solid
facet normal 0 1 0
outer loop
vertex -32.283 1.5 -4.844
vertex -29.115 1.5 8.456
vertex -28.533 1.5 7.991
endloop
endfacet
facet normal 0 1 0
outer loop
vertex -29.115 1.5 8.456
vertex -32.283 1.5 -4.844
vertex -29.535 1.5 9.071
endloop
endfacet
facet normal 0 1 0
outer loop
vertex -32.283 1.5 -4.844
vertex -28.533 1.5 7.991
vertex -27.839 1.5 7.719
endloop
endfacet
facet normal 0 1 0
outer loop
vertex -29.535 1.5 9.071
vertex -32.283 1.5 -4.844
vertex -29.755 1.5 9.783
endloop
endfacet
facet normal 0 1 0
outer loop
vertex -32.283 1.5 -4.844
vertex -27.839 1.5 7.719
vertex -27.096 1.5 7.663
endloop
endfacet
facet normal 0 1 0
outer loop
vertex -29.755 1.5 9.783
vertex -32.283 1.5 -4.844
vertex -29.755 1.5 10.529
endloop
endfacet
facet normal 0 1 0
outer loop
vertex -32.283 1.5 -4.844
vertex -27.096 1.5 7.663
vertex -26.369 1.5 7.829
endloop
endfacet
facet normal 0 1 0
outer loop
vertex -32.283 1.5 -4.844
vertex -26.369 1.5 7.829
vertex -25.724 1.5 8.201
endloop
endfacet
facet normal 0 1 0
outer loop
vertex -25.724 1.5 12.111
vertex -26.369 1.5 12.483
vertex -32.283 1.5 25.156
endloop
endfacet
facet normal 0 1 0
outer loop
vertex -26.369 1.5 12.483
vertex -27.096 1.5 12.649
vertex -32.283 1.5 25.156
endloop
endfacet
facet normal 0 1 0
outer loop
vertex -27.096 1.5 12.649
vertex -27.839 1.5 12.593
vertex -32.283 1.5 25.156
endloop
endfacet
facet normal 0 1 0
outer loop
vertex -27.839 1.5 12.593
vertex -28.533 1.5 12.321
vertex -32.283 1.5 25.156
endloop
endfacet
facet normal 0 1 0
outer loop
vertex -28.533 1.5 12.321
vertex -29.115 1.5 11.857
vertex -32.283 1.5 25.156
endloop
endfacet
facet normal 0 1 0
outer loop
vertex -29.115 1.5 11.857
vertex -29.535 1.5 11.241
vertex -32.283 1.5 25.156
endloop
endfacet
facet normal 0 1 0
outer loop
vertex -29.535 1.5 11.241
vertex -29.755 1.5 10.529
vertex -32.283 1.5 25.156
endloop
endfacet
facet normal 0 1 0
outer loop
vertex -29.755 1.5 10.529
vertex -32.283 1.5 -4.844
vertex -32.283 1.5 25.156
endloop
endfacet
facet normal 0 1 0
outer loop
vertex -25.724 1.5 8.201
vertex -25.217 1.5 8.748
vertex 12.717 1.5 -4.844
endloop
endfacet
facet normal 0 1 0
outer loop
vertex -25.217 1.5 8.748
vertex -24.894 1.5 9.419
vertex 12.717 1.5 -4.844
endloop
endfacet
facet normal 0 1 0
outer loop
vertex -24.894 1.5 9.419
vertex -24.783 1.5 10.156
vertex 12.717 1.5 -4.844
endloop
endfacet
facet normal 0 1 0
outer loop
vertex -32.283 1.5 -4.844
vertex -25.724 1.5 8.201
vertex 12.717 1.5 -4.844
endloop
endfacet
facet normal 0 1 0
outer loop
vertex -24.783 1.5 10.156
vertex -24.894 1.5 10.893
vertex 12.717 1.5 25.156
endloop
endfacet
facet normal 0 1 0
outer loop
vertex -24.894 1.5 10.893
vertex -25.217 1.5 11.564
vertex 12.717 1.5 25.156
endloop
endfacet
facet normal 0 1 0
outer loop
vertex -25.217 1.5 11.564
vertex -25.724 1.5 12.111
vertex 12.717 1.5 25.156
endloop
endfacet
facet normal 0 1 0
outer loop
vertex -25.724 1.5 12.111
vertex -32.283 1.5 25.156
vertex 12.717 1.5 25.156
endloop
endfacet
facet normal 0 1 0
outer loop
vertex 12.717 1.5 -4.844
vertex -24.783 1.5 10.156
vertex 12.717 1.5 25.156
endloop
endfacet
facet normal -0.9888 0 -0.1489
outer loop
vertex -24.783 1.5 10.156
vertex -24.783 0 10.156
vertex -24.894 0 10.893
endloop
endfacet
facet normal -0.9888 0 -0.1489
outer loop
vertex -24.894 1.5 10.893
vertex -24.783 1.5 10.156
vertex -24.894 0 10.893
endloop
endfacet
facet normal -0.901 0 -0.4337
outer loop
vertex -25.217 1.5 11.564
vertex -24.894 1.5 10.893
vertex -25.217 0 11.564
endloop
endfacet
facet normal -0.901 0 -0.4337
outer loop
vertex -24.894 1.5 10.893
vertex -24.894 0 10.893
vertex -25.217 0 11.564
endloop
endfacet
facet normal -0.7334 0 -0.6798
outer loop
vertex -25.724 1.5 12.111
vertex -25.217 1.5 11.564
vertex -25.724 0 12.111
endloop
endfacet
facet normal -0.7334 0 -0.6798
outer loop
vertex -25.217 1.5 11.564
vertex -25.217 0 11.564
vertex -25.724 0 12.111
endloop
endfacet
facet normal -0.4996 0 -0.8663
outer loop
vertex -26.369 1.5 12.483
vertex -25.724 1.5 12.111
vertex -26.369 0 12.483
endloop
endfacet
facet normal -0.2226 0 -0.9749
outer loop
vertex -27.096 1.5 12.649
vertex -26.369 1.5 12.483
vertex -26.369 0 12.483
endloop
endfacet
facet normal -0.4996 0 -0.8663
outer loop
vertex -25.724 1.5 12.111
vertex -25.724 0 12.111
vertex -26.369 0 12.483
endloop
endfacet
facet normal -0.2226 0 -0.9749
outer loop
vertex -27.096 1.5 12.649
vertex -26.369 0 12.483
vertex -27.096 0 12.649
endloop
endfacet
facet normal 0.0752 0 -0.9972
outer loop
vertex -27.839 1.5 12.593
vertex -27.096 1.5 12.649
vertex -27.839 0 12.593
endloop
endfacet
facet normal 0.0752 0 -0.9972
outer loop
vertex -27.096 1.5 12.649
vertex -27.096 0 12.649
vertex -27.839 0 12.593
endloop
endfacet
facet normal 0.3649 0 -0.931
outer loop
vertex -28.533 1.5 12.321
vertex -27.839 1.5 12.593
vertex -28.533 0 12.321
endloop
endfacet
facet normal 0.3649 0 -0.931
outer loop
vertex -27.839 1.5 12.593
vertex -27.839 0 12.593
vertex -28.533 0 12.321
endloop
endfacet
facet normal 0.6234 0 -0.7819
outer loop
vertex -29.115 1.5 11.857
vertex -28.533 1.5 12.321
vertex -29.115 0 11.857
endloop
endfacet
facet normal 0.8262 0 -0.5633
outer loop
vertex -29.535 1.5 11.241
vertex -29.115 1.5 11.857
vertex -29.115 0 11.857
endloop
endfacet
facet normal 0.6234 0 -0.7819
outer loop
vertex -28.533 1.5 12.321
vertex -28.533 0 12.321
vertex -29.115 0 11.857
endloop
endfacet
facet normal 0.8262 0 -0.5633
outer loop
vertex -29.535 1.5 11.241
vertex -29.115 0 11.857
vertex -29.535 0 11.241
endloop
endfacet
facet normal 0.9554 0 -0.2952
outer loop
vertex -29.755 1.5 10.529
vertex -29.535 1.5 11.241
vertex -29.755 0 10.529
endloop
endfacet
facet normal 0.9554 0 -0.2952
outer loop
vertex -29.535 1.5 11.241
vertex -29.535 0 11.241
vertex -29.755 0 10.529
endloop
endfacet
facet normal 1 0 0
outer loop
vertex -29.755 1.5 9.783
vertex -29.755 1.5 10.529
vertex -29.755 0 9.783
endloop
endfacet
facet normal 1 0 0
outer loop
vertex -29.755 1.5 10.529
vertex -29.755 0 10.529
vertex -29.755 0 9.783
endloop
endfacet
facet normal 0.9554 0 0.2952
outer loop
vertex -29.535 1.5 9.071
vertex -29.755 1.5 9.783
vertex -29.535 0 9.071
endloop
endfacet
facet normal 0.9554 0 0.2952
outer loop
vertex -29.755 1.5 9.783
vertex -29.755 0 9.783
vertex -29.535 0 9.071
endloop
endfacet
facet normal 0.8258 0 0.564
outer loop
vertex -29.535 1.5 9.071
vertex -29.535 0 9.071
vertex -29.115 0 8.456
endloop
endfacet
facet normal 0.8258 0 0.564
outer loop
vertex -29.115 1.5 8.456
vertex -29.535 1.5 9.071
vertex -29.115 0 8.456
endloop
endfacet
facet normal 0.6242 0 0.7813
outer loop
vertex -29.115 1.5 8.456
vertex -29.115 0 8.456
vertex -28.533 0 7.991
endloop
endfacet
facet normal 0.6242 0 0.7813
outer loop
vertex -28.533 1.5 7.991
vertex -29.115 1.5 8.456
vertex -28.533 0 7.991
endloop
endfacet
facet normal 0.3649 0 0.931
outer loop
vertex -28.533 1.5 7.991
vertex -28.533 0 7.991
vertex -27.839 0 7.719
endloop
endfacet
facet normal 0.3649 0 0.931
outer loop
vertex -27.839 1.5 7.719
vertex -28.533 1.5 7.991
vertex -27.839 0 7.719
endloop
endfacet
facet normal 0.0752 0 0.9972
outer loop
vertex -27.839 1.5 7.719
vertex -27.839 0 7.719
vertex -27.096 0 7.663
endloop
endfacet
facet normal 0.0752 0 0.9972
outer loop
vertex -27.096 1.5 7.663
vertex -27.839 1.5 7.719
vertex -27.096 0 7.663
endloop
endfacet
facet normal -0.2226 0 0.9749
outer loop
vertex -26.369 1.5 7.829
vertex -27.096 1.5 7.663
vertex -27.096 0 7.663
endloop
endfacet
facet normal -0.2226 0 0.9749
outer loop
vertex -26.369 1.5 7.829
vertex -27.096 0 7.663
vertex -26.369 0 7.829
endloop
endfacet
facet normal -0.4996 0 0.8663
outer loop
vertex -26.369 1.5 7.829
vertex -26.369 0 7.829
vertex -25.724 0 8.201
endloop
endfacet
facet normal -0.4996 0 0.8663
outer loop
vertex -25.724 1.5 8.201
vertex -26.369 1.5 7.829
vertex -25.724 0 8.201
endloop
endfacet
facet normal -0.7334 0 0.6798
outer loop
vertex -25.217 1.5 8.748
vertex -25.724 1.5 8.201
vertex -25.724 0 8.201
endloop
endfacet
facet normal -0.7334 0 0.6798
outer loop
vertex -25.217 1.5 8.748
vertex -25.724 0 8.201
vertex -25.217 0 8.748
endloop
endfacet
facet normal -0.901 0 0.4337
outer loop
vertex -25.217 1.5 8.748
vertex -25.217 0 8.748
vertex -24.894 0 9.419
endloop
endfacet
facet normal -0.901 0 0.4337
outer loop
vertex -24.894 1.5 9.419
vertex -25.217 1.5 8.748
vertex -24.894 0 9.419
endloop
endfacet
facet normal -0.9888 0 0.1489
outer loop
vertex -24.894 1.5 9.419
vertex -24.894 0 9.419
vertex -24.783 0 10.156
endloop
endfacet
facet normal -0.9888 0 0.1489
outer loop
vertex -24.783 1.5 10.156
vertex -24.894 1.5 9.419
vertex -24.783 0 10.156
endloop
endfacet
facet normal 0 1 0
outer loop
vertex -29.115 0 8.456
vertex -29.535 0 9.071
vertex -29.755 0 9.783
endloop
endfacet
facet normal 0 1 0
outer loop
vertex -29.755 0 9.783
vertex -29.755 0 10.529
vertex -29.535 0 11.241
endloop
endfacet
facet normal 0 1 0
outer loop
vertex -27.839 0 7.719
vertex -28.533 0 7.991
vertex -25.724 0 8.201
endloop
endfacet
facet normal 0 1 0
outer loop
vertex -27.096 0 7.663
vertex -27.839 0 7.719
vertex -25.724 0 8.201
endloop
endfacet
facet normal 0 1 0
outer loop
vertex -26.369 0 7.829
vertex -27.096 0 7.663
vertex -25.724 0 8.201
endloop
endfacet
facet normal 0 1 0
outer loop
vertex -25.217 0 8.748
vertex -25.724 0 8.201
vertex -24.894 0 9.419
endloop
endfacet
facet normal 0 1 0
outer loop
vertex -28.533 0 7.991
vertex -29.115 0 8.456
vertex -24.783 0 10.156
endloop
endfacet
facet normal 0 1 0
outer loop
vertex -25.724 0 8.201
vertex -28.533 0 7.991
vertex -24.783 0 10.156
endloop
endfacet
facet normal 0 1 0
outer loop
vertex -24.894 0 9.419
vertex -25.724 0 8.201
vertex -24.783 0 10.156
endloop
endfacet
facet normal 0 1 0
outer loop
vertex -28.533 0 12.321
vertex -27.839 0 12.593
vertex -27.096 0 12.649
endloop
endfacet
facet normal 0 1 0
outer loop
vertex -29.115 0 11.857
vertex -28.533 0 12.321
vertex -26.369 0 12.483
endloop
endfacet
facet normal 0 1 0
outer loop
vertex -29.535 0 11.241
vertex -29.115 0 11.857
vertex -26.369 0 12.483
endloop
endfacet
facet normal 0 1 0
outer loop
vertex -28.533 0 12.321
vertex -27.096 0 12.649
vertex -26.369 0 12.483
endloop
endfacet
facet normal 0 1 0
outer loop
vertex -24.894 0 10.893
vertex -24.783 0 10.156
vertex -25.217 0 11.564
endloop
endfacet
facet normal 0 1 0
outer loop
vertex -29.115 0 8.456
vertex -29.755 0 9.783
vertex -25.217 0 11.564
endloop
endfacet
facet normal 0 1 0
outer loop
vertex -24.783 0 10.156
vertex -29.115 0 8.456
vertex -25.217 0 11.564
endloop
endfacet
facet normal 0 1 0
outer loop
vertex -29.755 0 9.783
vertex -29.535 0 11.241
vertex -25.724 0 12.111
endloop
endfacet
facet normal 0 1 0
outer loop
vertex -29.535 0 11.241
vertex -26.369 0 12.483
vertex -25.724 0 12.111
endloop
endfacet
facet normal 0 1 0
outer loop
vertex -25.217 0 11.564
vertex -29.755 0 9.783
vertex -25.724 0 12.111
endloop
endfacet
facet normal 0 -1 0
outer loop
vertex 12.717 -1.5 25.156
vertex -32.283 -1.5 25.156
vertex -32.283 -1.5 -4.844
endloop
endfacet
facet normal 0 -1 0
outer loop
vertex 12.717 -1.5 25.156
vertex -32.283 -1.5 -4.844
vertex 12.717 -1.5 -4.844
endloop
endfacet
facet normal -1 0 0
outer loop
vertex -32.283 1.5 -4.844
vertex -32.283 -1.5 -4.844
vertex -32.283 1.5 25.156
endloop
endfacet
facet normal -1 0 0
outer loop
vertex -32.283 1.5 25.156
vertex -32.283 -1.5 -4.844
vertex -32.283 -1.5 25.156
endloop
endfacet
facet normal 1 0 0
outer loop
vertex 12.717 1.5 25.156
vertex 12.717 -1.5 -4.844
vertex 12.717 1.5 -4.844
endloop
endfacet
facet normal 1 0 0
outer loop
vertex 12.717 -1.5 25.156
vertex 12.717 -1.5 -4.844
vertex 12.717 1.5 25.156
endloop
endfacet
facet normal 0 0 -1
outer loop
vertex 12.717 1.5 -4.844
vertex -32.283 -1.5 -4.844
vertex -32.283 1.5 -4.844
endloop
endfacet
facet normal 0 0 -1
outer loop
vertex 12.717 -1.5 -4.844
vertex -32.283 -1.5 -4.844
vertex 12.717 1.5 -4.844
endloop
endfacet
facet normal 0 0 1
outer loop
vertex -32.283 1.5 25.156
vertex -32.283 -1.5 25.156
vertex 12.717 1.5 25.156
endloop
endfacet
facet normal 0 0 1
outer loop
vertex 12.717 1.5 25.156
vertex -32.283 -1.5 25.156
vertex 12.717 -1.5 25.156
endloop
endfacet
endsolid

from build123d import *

# Parameters (mm, degrees)
F0_W     = 45
F0_H     = 30
F1_DEPTH = 1.5
F2_D     = 5
F2_DEPTH = 1.501


with BuildPart() as f1:
    # F0 (on Front) → F1 (new body, symmetric)
    with BuildSketch(Plane.XZ):
        with Locations((-9.7826488498, 10.1560708135)):
            Rectangle(F0_W, F0_H)
    extrude(amount=F1_DEPTH, both=True)

    # F2 (through all, one way)
    with BuildSketch(Plane.XZ):
        with Locations((-27.2826488498, 10.1560708135)):
            Circle(F2_D / 2)
    extrude(amount=-F2_DEPTH, mode=Mode.SUBTRACT)


solid = f1.part
